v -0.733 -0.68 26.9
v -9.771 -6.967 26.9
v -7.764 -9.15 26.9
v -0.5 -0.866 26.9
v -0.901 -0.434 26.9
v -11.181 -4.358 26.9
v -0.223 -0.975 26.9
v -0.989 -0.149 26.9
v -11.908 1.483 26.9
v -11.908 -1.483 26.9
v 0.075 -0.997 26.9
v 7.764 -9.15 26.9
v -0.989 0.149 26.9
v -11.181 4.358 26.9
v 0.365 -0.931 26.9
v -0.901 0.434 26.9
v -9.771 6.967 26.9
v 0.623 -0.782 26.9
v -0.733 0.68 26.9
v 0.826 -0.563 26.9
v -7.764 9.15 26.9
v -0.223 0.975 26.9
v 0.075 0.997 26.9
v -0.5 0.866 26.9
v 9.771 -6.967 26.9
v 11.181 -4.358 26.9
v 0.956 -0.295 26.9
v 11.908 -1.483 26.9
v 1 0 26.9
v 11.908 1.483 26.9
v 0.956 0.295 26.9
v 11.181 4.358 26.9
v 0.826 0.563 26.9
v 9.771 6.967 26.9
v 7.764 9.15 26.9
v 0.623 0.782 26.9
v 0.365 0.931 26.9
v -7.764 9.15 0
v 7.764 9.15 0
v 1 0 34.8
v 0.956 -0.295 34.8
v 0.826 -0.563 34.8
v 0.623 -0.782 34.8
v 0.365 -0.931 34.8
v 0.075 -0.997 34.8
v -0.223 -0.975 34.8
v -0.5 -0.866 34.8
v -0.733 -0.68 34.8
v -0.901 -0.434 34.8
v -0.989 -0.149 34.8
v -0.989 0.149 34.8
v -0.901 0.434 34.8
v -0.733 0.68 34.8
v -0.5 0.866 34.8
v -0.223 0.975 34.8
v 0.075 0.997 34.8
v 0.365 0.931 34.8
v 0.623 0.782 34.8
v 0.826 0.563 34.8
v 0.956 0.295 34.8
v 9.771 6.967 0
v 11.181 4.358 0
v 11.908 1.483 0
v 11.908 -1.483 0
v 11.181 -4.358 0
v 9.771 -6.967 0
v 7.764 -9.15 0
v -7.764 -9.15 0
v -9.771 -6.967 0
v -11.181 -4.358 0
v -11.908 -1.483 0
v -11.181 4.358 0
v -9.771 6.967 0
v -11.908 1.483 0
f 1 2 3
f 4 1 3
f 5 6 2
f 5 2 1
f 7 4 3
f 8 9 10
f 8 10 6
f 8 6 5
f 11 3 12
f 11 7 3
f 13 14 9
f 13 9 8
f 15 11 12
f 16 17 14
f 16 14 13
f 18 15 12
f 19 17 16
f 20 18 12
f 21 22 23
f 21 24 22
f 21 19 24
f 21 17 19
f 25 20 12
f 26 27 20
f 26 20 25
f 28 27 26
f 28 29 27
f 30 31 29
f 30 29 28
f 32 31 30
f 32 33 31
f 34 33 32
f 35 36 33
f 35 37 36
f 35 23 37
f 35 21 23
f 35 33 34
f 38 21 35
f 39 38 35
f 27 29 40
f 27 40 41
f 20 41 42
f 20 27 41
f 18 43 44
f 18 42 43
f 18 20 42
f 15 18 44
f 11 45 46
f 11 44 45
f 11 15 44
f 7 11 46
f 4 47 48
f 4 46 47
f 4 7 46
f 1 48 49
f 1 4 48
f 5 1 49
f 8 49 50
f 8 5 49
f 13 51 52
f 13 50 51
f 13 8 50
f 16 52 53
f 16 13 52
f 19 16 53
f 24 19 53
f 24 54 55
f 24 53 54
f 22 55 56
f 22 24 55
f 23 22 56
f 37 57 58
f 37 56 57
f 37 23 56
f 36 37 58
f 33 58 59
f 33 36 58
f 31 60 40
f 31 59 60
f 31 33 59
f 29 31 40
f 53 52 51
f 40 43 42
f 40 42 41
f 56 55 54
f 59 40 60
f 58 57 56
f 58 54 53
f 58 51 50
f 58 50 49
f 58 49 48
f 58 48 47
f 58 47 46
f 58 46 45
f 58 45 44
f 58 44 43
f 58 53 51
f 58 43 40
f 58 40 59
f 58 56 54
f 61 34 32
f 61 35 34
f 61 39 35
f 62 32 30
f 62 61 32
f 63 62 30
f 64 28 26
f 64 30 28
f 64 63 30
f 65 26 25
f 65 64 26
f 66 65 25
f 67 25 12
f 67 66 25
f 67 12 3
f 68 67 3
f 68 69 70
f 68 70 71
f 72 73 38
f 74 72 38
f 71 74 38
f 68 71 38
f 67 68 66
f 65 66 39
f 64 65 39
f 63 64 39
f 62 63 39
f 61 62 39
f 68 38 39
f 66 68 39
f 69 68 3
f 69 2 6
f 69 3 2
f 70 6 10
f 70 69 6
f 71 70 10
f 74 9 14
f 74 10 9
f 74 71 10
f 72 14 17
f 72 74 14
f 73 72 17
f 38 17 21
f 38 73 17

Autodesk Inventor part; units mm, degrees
ref_plane "YZ Plane" through (0, 0, 0) normal (1, 0, 0) x (0, 1, 0)
ref_plane "XZ Plane" through (0, 0, 0) normal (0, 1, 0) x (-1, 0, 0)
ref_plane "XY Plane" through (0, 0, 0) normal (0, 0, 1) x (1, 0, 0)
sketch "Sketch1" plane through (0, 0, 0) normal (0, 0, 1) x (1, 0, 0)
  line L0 (7.7639, -9.15) -> (-7.7639, -9.15)
  line L1 (-7.7639, -9.15) -> (-7.7639, 9.15) construction
  line L2 (-7.7639, 9.15) -> (7.7639, 9.15)
  line L3 (7.7639, -9.15) -> (-7.7639, 9.15) construction
  line L4 (-7.7639, -9.15) -> (7.7639, 9.15) construction
  arc A0 (-7.7639, 9.15) -> (-7.7639, -9.15) centre (0, 0) ccw
  arc A1 (7.7639, -9.15) -> (7.7639, 9.15) centre (0, 0) ccw
  dimension "d8" = 18.3
extrude "Extrusion1" add sketch "Sketch1" along normal blind 26.9
sketch "Sketch2" plane through (0, 0, 26.9) normal (0, 0, 1) x (1, 0, 0)
  circle A0 centre (0, 0) radius 1
  dimension "d4" = 2
extrude "Extrusion2" add sketch "Sketch2" along normal blind 7.9
properties part number "dc_motor"
